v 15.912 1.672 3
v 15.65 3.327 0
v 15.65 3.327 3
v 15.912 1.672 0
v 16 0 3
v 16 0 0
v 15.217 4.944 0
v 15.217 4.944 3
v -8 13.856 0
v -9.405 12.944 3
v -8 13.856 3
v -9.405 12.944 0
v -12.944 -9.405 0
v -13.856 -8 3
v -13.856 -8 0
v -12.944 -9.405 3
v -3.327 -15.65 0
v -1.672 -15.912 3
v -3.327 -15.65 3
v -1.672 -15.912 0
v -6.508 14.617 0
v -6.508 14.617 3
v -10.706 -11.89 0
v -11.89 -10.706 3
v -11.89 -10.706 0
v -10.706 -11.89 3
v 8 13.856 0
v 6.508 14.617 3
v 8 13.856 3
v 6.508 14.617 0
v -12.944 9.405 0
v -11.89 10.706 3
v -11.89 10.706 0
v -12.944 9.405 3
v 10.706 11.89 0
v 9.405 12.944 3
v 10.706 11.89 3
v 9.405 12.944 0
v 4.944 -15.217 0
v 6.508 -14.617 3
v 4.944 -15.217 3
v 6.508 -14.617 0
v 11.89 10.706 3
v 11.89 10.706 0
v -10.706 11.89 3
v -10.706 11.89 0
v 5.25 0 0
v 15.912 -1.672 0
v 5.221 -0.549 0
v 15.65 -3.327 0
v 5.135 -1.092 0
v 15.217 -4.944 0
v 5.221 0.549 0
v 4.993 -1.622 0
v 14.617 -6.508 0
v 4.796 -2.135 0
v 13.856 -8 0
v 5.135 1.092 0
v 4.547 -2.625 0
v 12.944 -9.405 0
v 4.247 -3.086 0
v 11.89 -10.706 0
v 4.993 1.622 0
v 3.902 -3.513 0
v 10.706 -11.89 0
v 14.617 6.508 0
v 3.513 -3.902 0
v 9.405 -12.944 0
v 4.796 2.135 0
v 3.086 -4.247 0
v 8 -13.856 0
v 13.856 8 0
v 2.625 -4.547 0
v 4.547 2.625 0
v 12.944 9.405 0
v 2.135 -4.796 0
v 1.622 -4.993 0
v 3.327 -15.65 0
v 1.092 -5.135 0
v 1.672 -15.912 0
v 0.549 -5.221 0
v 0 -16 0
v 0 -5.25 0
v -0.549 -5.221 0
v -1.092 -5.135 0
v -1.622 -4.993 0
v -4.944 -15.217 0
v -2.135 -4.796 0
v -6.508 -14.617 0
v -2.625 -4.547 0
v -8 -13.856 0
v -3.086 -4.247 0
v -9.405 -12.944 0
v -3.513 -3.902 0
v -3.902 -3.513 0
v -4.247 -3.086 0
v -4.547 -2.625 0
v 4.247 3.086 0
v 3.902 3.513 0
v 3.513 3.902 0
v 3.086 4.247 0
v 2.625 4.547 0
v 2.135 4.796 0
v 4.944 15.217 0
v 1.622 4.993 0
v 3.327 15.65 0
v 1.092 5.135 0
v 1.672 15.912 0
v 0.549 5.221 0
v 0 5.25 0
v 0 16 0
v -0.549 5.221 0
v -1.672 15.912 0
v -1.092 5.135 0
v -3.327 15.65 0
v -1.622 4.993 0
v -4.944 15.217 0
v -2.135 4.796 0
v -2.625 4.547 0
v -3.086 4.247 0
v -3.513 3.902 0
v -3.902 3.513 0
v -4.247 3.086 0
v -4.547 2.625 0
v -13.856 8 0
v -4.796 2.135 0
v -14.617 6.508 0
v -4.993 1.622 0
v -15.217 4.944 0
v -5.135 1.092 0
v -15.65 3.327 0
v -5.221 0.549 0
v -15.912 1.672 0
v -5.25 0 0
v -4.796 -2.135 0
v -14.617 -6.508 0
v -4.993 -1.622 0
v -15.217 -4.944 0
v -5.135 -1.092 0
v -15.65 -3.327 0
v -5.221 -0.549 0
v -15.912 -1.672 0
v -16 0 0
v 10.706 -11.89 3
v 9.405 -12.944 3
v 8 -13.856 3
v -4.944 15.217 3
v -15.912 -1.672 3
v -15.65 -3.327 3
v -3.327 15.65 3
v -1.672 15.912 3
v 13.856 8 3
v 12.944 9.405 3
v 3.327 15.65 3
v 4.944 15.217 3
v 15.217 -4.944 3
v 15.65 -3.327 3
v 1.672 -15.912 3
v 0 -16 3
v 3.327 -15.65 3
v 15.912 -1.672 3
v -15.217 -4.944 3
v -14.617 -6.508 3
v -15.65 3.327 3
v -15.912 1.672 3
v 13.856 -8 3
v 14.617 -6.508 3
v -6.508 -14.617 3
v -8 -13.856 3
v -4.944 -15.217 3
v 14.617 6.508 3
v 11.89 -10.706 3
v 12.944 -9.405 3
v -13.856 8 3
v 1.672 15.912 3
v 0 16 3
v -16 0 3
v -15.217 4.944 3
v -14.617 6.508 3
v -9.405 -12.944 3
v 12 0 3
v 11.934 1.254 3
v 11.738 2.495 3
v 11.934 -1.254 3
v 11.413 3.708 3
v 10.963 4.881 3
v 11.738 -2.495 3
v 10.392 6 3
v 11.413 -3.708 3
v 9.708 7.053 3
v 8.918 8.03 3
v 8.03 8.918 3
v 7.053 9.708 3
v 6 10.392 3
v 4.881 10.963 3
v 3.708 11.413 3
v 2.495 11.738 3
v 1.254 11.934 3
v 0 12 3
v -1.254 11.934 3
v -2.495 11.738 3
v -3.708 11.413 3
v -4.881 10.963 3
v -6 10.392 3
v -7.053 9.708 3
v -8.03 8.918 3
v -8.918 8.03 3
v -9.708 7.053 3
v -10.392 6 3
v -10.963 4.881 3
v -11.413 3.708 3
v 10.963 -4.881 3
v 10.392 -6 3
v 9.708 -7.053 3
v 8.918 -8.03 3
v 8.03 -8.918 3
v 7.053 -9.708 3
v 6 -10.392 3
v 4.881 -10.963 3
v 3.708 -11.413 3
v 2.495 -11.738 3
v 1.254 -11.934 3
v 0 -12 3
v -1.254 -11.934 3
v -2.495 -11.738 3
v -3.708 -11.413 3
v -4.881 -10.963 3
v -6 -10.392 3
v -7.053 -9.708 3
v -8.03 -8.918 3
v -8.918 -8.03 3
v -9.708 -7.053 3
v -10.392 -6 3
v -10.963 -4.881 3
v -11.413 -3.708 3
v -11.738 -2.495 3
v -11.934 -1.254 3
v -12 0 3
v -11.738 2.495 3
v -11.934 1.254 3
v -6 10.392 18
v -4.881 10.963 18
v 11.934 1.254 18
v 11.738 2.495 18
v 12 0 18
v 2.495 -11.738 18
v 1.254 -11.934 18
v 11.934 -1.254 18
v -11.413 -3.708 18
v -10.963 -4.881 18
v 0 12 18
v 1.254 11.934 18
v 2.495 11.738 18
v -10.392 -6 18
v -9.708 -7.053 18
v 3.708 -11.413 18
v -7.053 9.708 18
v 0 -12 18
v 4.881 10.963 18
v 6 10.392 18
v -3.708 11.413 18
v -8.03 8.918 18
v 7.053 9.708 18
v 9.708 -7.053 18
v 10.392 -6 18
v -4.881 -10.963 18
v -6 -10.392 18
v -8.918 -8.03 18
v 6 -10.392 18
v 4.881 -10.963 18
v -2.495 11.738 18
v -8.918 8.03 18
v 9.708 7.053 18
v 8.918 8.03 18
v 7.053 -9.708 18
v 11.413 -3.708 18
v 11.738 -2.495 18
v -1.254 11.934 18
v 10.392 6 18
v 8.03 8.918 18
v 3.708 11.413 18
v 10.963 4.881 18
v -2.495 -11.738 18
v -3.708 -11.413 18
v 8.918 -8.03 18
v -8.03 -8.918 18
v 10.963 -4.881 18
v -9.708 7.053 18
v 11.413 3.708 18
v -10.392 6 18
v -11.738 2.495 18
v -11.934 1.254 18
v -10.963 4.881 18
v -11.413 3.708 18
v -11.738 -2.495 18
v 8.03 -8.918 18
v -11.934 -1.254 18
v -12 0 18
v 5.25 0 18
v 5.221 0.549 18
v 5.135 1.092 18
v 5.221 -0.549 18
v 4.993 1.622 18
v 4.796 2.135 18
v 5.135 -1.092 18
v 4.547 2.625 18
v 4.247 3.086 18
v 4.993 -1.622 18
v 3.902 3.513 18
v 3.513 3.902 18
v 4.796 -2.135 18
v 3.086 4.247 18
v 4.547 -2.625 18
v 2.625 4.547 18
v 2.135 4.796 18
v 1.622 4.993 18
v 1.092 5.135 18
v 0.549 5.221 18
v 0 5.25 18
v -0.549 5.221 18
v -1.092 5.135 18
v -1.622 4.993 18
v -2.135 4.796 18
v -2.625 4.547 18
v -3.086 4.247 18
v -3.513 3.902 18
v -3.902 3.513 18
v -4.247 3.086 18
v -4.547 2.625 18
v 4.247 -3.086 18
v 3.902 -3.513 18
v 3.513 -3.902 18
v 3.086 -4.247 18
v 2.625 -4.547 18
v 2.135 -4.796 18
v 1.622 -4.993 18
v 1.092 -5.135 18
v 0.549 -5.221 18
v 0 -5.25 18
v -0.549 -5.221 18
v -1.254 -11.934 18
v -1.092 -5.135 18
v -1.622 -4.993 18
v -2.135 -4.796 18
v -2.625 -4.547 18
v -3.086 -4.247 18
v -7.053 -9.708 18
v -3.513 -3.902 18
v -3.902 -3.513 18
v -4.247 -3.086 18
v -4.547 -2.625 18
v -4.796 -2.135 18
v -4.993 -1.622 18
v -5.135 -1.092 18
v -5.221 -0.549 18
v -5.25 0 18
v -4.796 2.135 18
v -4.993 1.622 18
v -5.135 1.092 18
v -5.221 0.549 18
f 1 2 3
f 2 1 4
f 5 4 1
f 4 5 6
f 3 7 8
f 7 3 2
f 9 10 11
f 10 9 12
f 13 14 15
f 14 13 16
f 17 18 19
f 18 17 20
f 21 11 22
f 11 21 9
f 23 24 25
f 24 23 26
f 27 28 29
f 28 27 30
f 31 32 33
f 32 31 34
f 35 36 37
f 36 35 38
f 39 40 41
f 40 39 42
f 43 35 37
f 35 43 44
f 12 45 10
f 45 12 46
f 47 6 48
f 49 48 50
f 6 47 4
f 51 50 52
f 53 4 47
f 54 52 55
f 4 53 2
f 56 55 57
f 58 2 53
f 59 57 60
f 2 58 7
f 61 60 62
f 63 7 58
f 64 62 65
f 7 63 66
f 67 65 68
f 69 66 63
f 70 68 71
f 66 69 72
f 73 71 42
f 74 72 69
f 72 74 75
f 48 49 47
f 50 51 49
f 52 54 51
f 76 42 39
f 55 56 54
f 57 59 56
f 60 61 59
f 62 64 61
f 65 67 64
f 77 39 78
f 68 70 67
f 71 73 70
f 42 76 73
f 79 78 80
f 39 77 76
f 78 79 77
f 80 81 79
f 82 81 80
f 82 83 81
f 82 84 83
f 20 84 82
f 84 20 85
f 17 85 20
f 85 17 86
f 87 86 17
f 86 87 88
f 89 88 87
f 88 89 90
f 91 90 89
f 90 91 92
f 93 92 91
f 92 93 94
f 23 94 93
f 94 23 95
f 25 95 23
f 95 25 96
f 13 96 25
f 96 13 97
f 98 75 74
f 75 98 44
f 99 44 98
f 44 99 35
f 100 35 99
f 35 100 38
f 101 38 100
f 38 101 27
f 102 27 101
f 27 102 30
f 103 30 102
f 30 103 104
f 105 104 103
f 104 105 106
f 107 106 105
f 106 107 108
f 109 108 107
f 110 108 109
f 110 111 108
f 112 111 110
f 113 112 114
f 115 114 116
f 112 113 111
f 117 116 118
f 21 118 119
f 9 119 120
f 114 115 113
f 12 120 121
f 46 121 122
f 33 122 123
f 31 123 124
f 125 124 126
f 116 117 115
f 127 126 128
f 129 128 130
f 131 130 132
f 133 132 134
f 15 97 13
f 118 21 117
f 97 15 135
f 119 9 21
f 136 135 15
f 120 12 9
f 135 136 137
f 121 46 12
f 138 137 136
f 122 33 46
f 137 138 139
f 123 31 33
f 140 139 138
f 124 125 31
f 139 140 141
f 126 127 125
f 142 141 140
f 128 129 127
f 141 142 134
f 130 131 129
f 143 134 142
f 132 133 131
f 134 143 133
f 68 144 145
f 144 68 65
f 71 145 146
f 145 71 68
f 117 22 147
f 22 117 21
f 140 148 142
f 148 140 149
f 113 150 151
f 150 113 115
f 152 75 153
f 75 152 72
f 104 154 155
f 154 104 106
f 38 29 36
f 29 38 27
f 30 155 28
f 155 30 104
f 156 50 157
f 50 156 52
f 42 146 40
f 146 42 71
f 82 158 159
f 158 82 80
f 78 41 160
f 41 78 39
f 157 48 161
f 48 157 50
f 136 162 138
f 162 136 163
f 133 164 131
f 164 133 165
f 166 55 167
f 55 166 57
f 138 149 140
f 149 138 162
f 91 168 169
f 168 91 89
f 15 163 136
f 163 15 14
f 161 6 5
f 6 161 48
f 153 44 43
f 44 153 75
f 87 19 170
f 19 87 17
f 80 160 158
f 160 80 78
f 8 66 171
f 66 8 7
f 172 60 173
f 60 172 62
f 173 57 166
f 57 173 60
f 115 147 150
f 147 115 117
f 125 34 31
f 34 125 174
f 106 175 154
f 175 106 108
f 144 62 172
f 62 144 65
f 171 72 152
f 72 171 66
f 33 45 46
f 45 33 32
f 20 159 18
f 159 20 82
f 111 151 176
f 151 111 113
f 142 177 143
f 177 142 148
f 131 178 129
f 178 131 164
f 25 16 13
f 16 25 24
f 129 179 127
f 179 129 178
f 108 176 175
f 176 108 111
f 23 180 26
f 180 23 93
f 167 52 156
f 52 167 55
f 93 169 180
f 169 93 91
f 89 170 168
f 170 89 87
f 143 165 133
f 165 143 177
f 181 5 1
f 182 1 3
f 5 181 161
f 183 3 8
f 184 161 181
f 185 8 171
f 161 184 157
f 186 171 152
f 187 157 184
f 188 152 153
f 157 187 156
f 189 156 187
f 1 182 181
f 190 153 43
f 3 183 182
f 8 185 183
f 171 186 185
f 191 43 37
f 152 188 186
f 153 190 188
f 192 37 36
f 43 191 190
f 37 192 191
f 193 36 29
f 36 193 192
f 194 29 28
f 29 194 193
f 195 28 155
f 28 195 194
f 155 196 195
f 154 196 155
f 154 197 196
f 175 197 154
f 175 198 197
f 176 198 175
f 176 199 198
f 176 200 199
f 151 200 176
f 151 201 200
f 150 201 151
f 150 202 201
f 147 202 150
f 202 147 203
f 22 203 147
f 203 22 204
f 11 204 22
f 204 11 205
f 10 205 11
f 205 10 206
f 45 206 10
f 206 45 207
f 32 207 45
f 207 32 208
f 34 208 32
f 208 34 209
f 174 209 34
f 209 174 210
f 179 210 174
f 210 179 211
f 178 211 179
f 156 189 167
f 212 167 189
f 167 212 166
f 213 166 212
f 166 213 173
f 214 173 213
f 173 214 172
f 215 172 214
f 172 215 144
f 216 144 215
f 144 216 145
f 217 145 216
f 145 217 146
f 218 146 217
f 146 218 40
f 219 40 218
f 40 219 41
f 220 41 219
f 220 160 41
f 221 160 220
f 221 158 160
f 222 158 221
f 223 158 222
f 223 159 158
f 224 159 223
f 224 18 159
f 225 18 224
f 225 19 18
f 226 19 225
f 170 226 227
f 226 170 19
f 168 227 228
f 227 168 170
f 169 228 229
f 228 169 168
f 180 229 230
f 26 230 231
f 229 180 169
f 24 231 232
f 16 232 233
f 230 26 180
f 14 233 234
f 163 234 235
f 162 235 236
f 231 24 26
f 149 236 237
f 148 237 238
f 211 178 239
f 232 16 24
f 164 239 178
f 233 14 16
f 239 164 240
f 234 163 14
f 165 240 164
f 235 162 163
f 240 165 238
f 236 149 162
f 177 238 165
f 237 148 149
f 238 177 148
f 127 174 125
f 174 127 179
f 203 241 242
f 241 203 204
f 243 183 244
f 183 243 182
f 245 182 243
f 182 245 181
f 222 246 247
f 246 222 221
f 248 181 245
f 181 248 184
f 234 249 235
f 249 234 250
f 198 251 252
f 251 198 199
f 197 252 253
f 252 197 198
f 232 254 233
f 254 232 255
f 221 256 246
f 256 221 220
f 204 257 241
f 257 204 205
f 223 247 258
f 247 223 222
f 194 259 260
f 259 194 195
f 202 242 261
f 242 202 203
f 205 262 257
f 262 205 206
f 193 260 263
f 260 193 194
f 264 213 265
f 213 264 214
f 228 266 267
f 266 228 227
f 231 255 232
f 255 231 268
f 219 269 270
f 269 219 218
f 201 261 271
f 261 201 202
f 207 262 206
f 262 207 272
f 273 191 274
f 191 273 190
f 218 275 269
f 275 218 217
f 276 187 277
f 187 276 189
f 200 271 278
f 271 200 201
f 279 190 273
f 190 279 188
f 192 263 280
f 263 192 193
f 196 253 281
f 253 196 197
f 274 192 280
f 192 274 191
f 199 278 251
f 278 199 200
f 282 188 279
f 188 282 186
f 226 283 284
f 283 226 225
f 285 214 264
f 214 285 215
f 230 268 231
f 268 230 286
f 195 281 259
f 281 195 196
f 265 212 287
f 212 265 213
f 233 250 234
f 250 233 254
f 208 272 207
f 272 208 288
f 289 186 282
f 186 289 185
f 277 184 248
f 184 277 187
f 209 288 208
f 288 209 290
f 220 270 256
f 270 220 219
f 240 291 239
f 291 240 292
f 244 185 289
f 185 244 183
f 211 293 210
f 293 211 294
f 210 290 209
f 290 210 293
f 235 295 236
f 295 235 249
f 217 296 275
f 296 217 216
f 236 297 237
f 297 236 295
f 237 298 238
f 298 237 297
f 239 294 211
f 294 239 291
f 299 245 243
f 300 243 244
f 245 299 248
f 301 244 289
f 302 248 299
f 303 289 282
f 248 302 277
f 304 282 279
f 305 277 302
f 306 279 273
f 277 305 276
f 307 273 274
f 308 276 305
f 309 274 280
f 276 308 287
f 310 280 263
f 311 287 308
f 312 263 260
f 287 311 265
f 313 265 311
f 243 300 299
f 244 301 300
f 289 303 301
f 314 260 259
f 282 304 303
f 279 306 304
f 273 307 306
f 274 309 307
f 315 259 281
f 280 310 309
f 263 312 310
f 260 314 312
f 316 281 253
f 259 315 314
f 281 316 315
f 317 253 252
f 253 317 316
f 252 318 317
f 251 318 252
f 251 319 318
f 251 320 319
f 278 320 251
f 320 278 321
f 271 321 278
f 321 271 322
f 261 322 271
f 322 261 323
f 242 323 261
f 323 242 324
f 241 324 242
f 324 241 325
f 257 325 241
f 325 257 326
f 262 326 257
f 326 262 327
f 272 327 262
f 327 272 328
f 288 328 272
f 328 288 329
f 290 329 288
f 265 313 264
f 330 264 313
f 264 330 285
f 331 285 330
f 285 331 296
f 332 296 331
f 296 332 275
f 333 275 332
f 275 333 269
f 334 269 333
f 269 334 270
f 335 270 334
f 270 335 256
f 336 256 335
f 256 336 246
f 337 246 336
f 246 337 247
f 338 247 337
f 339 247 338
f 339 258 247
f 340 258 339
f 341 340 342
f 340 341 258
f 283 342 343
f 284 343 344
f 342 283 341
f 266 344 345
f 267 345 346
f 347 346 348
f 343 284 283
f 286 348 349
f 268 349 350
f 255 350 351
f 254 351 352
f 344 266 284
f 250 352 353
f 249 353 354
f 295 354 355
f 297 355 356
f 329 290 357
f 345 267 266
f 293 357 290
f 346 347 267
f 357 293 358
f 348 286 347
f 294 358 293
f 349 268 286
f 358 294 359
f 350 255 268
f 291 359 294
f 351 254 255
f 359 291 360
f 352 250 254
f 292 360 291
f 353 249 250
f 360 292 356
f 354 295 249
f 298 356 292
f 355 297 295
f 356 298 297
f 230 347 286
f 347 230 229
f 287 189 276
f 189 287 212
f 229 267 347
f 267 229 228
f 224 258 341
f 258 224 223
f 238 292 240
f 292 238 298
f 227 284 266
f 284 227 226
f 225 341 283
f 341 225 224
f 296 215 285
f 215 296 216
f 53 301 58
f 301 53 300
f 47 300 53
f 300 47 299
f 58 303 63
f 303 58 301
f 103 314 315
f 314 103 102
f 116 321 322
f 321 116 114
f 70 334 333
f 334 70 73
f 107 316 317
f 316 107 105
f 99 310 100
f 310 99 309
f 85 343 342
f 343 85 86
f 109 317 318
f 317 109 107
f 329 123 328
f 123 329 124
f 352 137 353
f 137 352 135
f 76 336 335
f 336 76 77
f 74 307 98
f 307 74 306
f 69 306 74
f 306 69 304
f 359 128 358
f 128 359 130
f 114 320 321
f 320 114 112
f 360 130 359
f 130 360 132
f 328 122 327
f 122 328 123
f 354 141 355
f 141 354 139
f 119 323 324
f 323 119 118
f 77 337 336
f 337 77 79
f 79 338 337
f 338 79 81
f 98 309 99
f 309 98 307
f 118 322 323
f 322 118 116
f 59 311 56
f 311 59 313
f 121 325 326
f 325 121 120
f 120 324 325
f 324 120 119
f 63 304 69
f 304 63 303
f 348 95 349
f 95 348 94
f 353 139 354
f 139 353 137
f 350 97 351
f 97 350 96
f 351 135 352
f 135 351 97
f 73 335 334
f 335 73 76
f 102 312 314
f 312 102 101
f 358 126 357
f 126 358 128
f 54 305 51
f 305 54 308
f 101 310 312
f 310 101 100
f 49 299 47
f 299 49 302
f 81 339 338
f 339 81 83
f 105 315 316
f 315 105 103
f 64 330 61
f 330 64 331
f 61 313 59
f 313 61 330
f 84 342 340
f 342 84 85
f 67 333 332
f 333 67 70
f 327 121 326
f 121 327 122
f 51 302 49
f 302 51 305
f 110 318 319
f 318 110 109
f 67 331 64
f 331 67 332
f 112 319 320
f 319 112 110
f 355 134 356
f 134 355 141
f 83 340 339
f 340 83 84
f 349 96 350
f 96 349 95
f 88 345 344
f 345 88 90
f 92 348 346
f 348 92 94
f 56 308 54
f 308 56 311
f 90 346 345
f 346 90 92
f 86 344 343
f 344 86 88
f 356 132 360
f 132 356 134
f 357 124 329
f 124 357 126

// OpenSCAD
// Cable gland body for 10 mm cable.
$fn = 60;
eps = 0.02;
cable_d = 10;
body_d = 24;
body_l = 18;
flange_d = body_d + 8;
flange_t = 3;
difference() {
    union() { cylinder(d = flange_d, h = flange_t); cylinder(d = body_d, h = body_l); }
    translate([0, 0, -eps]) cylinder(d = cable_d + 0.5, h = body_l + 2 * eps);
}
